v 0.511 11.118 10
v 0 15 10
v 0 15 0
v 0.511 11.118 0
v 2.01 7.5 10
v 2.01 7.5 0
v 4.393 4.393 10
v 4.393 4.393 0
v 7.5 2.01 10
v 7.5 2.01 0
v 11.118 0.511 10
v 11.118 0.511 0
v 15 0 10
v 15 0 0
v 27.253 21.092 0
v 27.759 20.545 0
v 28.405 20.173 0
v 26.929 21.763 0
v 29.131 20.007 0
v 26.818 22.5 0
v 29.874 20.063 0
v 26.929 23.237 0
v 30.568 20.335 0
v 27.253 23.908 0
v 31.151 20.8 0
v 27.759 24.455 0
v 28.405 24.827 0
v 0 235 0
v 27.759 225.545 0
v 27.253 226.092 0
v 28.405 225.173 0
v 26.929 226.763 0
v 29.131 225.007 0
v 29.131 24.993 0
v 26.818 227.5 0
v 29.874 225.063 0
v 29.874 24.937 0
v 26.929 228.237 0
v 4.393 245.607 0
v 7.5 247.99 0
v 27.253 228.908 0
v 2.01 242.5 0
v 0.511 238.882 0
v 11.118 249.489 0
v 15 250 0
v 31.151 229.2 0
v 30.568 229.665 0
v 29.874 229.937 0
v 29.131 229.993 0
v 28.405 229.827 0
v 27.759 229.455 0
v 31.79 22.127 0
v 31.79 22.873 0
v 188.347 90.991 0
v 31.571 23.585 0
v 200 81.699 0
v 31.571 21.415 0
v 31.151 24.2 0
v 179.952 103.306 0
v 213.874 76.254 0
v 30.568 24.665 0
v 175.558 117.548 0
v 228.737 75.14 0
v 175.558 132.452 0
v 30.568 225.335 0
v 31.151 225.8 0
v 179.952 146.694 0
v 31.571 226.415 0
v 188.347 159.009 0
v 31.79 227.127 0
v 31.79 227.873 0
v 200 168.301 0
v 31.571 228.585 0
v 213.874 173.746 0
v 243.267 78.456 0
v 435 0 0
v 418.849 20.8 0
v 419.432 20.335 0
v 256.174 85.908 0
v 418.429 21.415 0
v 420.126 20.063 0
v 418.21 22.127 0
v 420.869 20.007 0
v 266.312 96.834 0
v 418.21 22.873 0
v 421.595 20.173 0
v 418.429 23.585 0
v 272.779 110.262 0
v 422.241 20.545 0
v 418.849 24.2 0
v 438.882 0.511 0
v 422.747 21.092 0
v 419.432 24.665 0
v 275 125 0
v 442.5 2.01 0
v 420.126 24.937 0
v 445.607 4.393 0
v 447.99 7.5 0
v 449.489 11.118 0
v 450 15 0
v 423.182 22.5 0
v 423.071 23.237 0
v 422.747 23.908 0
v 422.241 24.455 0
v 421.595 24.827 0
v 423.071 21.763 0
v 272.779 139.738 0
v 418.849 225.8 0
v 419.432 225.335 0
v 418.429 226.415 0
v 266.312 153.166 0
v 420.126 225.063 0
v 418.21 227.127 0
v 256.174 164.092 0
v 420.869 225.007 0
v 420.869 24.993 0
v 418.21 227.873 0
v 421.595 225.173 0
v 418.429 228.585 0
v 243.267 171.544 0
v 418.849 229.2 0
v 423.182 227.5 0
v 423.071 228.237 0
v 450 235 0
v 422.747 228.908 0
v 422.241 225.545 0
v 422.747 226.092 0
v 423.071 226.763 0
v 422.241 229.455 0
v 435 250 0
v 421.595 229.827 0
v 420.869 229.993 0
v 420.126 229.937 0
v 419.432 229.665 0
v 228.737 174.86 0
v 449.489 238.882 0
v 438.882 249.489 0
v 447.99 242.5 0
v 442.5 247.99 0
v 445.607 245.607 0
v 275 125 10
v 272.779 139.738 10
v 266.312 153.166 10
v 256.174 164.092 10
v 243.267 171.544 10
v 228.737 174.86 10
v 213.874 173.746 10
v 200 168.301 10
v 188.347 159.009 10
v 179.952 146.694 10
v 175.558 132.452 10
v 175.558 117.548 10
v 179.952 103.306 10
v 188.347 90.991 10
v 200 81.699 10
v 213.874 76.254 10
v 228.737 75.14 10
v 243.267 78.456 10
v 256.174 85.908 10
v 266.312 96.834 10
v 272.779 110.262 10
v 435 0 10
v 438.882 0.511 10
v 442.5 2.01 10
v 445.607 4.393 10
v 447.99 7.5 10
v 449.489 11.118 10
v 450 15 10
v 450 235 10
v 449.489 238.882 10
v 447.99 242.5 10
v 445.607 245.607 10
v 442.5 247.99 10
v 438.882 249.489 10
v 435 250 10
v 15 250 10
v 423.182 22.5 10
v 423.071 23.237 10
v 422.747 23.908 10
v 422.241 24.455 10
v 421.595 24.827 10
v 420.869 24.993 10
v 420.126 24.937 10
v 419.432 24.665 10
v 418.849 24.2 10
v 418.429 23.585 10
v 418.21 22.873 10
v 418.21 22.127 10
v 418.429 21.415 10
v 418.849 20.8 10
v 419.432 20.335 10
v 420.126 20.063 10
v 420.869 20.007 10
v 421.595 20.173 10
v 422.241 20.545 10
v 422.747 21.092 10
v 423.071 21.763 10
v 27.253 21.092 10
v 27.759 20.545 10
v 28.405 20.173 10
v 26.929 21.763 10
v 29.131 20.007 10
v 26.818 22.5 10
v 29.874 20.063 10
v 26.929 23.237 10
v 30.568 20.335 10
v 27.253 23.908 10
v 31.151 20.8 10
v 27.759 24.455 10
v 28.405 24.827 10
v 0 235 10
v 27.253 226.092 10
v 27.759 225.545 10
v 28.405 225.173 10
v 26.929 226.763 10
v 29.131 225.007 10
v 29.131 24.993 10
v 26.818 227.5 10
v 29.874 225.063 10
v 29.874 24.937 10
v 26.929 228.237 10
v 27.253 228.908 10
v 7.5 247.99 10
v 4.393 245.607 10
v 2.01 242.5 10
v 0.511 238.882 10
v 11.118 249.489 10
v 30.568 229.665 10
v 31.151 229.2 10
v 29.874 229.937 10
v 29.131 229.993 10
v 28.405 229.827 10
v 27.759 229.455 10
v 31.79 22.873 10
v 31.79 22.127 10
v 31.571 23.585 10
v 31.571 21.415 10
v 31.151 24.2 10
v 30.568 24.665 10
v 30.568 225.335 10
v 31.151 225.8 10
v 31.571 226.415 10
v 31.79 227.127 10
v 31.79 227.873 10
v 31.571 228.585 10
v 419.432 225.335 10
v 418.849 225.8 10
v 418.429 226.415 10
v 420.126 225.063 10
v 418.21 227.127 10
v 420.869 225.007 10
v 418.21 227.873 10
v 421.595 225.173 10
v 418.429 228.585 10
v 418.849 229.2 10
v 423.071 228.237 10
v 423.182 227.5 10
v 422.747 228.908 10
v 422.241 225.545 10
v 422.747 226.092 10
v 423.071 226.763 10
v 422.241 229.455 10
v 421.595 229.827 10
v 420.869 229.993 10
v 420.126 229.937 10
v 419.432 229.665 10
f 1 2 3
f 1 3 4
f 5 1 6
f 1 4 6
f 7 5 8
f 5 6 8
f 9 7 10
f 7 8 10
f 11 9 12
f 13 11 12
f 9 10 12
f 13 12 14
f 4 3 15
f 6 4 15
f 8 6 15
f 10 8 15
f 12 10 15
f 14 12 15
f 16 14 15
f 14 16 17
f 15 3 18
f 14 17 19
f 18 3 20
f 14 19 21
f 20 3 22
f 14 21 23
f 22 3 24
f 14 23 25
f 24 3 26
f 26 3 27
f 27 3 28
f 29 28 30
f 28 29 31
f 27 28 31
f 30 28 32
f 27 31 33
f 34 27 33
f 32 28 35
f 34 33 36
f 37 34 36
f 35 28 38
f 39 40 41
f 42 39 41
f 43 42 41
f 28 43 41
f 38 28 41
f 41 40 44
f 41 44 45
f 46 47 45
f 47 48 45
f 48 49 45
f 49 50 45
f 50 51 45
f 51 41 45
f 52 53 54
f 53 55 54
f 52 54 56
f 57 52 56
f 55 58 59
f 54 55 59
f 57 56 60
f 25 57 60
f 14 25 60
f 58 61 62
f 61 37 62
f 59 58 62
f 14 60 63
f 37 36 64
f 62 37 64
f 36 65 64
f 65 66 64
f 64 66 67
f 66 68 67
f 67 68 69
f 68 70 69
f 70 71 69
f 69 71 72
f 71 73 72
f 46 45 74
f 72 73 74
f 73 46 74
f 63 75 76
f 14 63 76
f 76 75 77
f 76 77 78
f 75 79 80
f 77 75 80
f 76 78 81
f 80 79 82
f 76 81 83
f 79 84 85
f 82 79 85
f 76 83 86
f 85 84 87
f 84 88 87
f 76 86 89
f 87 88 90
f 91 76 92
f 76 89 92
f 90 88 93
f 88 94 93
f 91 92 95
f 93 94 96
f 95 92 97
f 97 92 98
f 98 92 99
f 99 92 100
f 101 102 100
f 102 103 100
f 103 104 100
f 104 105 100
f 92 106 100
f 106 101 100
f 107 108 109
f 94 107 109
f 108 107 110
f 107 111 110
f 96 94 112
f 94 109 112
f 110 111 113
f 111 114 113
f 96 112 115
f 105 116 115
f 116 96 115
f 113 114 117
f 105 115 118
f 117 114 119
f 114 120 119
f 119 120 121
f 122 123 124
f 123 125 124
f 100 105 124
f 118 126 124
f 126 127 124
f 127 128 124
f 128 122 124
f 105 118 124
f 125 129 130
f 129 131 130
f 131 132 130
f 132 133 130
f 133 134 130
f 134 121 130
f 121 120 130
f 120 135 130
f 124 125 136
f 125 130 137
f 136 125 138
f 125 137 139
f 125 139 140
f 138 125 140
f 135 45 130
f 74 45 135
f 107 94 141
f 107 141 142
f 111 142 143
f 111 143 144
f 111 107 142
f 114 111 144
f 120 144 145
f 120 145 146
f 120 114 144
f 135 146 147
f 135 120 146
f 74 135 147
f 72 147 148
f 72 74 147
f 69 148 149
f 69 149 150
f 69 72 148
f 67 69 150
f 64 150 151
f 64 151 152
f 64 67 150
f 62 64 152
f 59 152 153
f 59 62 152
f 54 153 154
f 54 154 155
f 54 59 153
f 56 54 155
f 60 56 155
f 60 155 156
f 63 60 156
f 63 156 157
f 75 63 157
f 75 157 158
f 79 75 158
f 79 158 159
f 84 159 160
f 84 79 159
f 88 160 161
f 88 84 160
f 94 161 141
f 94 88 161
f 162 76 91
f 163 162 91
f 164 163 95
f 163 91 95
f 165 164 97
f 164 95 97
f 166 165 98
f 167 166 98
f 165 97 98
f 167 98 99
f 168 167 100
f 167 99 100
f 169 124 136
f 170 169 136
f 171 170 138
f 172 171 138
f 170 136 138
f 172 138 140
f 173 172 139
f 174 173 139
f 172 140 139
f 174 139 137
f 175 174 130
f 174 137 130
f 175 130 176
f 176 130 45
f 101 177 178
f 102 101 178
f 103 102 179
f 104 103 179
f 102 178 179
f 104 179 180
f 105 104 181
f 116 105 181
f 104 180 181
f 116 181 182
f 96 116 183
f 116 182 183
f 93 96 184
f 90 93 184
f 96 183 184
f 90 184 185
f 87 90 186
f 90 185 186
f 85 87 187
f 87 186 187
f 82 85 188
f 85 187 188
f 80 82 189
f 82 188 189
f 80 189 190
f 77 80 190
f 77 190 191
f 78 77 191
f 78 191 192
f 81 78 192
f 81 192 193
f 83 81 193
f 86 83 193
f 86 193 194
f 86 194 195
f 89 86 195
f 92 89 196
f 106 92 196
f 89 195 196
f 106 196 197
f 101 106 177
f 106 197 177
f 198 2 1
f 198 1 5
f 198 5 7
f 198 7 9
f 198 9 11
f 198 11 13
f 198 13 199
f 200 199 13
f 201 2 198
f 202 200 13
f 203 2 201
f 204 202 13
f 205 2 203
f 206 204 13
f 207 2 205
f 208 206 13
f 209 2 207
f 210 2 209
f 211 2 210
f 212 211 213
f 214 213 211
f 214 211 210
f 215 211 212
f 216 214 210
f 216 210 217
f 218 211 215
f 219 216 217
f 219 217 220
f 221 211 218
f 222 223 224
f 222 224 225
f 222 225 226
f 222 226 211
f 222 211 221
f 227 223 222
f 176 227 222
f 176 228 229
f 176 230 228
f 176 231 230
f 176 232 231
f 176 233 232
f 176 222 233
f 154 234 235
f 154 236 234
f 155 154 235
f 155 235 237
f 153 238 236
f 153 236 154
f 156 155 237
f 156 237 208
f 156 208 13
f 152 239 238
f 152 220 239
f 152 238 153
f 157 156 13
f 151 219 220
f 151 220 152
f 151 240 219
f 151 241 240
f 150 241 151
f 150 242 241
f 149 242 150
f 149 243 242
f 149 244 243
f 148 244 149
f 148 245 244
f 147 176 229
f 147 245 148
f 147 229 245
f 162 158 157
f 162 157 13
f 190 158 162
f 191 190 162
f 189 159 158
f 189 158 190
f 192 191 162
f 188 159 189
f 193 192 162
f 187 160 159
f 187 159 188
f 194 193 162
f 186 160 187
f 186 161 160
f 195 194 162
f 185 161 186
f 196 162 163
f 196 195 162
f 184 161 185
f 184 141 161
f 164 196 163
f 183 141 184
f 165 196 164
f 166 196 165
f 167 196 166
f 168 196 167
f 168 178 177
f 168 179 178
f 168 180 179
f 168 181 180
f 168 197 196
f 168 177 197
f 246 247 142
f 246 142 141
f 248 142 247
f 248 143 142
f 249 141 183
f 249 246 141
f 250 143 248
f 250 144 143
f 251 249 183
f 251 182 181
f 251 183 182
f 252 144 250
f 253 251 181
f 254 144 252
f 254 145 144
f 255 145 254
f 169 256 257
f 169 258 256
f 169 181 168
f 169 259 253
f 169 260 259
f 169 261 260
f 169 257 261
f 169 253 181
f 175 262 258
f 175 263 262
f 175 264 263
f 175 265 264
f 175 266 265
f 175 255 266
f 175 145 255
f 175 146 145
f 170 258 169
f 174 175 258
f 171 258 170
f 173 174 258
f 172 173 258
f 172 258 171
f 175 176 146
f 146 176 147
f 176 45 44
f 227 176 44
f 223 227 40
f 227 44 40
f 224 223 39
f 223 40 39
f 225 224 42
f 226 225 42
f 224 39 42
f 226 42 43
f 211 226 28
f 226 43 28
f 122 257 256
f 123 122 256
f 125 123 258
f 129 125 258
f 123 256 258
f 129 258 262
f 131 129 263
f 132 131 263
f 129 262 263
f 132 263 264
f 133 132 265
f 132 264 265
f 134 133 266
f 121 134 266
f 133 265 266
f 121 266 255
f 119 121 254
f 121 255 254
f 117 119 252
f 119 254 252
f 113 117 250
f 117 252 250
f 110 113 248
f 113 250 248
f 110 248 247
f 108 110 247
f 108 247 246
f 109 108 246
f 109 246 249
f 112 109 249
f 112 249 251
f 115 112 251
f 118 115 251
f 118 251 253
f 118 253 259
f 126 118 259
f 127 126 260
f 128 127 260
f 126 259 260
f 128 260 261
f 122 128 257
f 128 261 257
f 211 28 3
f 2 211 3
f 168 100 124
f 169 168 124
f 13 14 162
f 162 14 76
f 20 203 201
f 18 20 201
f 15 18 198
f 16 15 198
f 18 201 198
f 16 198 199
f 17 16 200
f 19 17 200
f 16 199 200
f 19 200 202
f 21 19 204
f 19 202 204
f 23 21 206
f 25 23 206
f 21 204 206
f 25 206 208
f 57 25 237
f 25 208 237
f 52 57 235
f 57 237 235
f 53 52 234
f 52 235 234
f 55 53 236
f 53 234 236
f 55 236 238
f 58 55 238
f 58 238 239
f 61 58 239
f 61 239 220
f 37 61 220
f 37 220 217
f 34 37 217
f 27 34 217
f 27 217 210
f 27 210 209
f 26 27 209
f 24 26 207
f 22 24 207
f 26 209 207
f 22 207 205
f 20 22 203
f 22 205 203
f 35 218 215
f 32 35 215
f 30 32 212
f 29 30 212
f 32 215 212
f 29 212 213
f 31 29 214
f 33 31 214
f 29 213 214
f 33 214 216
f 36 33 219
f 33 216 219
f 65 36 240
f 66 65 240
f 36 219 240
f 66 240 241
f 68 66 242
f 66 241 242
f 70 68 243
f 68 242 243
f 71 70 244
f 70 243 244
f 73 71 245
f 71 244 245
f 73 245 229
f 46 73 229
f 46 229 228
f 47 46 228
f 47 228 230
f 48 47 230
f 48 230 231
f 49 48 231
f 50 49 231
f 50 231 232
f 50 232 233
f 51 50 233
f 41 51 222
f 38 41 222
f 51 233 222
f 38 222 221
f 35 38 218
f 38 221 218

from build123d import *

# Parameters (mm, degrees)
CROQUIS1_R              = 50
SALIENTE_EXTRUIR1_DEPTH = 10
CROQUIS2_R              = 2.5
CORTAR_EXTRUIR1_DEPTH   = 10


with BuildPart() as part:
    # Croquis1 → Saliente-Extruir1 (new body)
    with BuildSketch(Plane.XY):
        with BuildLine():
            Line((15, 0), (435, 0))
            ThreePointArc((435, 0), (445.606601718, 4.393398282), (450, 15))
            Line((450, 15), (450, 235))
            ThreePointArc((450, 235), (445.606601718, 245.606601718), (435, 250))
            Line((435, 250), (15, 250))
            ThreePointArc((15, 250), (4.393398282, 245.606601718), (0, 235))
            Line((0, 235), (0, 15))
            ThreePointArc((0, 15), (4.393398282, 4.393398282), (15, 0))
        make_face()
        with Locations((225, 125)):
            Circle(CROQUIS1_R, mode=Mode.SUBTRACT)
    extrude(amount=SALIENTE_EXTRUIR1_DEPTH)

    # Croquis2 → Cortar-Extruir1 (cut)
    with BuildSketch(Plane.XY.offset(10)):
        with Locations((420.681818182, 22.5)):
            Circle(CROQUIS2_R)
        with Locations((420.681818182, 227.5)):
            Circle(CROQUIS2_R)
        with Locations(Location((29.318181818, 227.5, 0), (0, 0, 180))):
            Circle(CROQUIS2_R)
        with Locations(Location((29.318181818, 22.5, 0), (0, 0, 180))):
            Circle(CROQUIS2_R)
    extrude(amount=-CORTAR_EXTRUIR1_DEPTH, mode=Mode.SUBTRACT)


solid = part.part
